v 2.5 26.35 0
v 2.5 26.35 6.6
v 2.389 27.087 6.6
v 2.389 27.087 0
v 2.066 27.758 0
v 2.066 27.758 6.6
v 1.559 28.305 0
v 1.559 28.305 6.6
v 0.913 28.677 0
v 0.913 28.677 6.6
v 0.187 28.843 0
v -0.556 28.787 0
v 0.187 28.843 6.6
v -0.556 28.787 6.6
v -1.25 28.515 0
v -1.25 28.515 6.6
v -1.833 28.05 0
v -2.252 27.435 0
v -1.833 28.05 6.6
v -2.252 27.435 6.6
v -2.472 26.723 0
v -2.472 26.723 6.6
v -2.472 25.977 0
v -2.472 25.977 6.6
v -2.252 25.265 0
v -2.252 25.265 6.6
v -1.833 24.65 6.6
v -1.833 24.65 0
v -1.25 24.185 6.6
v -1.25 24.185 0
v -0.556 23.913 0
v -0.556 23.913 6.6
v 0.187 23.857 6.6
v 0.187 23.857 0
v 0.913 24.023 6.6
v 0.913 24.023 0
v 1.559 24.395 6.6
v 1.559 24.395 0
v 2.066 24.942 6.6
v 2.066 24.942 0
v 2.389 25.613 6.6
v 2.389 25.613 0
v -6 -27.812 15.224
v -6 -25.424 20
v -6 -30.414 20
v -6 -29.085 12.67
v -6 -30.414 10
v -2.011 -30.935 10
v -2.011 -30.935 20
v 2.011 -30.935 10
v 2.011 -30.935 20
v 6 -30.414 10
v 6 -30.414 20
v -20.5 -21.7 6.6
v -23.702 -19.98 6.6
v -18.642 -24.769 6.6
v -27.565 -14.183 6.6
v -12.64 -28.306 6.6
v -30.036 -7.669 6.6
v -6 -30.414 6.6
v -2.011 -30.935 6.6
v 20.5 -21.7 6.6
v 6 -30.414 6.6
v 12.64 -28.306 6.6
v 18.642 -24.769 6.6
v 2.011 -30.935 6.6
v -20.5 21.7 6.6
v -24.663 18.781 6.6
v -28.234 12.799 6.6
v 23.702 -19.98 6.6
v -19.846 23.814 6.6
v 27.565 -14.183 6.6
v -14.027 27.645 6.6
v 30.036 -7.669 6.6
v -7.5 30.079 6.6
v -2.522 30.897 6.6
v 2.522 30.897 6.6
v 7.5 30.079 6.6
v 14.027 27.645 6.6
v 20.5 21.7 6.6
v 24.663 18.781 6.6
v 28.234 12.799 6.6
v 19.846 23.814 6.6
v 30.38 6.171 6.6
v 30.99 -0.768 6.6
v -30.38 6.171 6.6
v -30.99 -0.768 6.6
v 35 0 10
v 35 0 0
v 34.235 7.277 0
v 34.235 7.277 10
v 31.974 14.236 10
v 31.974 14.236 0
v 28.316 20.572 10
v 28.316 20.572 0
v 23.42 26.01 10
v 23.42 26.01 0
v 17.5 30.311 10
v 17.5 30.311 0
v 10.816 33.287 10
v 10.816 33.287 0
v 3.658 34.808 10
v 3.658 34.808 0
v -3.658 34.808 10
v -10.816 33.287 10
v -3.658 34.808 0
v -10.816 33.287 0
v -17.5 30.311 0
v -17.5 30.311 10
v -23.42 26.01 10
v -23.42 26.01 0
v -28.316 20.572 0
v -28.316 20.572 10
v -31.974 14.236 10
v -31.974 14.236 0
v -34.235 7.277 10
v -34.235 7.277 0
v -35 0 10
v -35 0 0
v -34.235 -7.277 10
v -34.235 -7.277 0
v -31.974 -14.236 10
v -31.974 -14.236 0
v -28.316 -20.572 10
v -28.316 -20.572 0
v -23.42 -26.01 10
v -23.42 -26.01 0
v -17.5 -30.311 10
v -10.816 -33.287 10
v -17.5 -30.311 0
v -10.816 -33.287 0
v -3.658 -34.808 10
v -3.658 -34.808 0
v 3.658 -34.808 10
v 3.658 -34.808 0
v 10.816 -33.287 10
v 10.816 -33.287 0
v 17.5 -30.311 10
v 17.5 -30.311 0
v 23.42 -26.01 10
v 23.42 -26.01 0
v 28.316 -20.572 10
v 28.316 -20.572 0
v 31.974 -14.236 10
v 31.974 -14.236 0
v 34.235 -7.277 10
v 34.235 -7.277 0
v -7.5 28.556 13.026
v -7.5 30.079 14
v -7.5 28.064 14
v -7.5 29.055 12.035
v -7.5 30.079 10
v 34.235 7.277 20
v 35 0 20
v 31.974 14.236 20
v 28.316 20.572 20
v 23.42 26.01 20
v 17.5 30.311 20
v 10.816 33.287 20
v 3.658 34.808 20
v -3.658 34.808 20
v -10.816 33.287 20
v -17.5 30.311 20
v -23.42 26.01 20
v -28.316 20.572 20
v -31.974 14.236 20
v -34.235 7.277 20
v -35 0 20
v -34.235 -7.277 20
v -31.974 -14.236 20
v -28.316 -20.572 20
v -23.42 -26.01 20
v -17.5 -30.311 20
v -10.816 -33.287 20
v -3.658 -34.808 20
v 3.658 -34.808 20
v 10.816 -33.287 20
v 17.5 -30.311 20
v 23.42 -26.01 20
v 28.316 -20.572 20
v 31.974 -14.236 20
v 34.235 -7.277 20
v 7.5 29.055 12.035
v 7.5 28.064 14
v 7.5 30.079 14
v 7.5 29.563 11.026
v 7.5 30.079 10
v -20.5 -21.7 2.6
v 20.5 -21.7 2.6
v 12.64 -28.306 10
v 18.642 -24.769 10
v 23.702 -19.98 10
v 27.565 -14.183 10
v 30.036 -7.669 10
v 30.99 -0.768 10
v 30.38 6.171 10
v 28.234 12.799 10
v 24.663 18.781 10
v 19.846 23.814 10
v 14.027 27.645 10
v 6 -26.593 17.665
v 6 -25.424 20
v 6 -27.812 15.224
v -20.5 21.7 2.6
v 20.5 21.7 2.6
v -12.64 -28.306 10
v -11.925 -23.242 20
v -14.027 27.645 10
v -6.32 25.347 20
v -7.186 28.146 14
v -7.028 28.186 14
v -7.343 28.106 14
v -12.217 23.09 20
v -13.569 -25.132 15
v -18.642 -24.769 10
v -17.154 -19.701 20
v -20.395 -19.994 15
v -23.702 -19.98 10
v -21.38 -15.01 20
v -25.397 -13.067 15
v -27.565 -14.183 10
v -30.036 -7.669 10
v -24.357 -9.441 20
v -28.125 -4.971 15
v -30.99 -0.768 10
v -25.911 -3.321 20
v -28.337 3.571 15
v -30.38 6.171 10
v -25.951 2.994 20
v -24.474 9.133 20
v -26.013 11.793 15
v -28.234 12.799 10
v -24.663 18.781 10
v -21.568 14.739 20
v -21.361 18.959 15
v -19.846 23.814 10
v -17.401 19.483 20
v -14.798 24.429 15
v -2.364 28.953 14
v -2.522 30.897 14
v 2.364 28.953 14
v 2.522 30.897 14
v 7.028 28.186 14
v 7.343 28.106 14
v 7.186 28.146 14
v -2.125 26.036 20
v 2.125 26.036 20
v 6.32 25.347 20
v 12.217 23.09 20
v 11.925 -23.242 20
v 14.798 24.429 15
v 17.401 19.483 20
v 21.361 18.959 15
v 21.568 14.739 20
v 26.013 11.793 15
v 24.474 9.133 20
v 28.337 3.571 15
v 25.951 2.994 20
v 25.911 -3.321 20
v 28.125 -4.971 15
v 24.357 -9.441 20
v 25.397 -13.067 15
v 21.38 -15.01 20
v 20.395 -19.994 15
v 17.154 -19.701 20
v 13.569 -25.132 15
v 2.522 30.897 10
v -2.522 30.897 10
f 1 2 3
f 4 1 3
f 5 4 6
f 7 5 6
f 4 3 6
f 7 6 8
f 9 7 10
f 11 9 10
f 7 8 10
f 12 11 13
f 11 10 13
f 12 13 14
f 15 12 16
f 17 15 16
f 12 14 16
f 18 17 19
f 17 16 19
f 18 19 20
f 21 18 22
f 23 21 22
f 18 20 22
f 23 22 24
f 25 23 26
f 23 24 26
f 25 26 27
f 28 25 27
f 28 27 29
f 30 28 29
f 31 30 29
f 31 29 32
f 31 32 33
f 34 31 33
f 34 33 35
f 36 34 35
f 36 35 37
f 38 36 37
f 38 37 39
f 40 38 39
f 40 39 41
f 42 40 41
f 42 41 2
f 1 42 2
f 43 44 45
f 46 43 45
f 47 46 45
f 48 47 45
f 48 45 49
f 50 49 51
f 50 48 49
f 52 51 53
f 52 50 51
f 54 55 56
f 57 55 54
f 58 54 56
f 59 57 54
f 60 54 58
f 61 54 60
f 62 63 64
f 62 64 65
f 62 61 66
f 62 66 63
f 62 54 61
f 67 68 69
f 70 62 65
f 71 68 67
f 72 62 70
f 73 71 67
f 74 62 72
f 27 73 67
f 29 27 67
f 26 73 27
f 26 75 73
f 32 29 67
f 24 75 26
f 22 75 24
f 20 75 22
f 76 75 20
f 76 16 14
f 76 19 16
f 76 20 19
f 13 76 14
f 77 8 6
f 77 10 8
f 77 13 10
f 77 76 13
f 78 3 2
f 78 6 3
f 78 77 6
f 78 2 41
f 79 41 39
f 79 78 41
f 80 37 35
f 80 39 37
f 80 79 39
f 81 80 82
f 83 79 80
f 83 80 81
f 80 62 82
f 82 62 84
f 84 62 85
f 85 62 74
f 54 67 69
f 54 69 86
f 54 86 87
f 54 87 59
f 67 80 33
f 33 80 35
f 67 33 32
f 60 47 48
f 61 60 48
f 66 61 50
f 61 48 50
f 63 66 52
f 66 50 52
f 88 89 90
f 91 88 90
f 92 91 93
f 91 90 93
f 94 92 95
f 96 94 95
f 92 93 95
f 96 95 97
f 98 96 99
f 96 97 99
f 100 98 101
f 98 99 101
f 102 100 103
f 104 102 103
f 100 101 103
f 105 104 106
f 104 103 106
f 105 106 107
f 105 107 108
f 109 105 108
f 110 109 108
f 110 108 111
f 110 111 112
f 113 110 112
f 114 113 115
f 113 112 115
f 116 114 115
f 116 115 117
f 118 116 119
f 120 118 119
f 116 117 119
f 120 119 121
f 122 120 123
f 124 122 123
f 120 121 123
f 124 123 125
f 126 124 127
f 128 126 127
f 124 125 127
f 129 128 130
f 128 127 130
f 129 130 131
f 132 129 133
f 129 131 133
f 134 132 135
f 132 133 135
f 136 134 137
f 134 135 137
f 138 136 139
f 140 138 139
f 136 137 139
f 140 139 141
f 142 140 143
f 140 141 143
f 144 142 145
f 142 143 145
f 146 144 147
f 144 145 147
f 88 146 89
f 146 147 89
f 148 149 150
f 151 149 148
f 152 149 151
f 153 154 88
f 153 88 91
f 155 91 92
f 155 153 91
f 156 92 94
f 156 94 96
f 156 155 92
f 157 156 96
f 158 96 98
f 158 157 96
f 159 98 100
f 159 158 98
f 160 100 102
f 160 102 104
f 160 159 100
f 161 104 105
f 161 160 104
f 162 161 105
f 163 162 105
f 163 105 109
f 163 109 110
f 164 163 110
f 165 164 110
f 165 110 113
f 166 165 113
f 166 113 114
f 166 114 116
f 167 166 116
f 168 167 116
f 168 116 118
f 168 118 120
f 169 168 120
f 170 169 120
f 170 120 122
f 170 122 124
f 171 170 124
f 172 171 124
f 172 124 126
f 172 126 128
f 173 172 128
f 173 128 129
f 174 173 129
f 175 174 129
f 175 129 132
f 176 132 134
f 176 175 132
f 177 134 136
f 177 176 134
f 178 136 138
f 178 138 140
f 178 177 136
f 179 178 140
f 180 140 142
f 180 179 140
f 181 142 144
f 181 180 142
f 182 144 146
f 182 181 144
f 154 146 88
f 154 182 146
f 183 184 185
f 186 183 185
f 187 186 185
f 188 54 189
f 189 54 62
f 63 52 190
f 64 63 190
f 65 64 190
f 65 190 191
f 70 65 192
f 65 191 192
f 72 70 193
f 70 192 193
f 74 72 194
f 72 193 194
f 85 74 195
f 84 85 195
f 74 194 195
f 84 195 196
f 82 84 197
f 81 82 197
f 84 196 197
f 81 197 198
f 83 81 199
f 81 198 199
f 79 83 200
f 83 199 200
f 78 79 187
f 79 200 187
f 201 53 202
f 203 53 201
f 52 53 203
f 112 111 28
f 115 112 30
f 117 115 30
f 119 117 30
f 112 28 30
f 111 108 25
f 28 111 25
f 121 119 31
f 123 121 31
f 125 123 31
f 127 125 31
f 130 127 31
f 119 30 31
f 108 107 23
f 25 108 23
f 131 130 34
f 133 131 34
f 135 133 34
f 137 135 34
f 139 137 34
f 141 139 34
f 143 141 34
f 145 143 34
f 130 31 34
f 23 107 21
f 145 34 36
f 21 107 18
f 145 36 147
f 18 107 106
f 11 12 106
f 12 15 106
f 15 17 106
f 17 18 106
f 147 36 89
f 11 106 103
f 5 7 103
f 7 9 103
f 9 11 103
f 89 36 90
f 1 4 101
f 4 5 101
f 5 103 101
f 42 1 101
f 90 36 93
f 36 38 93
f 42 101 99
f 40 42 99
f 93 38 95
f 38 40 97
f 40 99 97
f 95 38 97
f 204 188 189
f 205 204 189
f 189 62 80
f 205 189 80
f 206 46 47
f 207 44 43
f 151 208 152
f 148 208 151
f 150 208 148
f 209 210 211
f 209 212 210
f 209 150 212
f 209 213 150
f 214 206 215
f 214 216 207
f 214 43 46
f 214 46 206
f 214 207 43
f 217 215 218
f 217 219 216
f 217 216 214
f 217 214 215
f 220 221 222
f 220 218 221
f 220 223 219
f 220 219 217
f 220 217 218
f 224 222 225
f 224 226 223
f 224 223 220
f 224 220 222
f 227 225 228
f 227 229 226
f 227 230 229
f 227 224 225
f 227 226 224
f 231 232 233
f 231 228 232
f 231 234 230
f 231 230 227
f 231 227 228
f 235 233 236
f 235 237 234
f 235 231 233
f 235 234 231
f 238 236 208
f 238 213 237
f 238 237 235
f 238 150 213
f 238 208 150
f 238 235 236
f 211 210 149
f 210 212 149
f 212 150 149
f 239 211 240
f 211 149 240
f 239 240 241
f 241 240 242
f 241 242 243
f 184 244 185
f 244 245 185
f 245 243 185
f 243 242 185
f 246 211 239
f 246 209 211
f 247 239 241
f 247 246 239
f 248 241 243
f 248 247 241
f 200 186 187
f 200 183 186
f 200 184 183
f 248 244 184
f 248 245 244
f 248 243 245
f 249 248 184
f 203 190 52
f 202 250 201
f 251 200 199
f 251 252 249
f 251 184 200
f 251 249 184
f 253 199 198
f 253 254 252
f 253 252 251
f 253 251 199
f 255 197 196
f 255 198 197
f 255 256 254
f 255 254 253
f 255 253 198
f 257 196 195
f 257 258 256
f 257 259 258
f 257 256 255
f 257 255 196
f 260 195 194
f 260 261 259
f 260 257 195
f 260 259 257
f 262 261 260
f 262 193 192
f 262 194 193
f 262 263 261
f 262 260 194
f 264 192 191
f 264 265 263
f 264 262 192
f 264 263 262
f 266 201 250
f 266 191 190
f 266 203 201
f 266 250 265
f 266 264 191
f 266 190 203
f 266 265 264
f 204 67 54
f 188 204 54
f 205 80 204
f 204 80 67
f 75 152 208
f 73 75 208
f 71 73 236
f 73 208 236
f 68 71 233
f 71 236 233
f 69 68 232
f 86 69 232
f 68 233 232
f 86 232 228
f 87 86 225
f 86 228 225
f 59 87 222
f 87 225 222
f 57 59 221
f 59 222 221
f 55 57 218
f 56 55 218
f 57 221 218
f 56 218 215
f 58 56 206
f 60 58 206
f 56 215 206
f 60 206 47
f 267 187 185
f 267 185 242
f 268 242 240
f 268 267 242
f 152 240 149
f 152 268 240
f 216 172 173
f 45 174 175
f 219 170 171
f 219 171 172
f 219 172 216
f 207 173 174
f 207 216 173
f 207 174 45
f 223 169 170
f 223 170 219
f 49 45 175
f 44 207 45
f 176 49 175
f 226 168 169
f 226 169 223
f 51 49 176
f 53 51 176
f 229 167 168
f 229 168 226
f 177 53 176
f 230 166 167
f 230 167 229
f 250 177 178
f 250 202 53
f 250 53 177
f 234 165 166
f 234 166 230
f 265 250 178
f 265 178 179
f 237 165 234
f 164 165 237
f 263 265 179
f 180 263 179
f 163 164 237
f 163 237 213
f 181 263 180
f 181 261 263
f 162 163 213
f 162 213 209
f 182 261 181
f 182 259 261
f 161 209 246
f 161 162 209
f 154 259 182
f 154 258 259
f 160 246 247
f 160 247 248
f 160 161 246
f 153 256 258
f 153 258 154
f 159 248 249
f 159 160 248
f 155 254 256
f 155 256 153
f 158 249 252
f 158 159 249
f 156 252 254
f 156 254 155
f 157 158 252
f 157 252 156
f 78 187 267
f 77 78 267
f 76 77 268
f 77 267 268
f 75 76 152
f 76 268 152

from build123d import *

# Parameters (mm, degrees)
F0_R      = 35
F1_DEPTH  = 10
F2_R      = 2.5
F3_DEPTH  = 3.4
F4_DEPTH  = 10.001
F5_DEPTH  = 7.4
F2_R_2    = 35
F6_DEPTH  = 10
F6_TAPER  = -26
F7_R      = 39.8773258857
F7_R_2    = 35
F8_DEPTH  = 20.001
F9_DEPTH  = 4
F10_DEPTH = 10.0010001


# Not quite as in the source:
# - a feature names something its author has since deleted; it is built from what else it names


with BuildPart() as f1:
    # F0 (on Top) → F1 (new body)
    with BuildSketch(Plane.XY):
        Circle(F0_R)
    extrude(amount=F1_DEPTH)

    # F2 (on face) → F3 (cut)
    with BuildSketch(Plane.XY.offset(10)):
        with BuildLine():
            Line((7.5, 21.7), (7.5, 30.0790624854))
            ThreePointArc((7.5, 30.0790624854), (0, 31), (-7.5, 30.0790624854))
            Line((-7.5, 30.0790624854), (-7.5, 21.7))
            Line((-7.5, 21.7), (7.5, 21.7))
        make_face()
        with Locations((0, 26.35)):
            Circle(F2_R, mode=Mode.SUBTRACT)
        with BuildLine():
            Line((-7.5, 21.7), (-7.5, 30.0790624854))
            ThreePointArc((-7.5, 30.0790624854), (-30.9904741103, -0.7684493597), (-6, -30.4138126515))
            Line((-6, -30.4138126515), (-6, -21.7))
            Line((-6, -21.7), (-20.5, -21.7))
            Line((-20.5, -21.7), (-20.5, 21.7))
            Line((-20.5, 21.7), (-7.5, 21.7))
        make_face()
        with BuildLine():
            ThreePointArc((-6, -30.4138126515), (0, -31), (6, -30.4138126515))
            Line((6, -30.4138126515), (6, -21.7))
            Line((6, -21.7), (-6, -21.7))
            Line((-6, -21.7), (-6, -30.4138126515))
        make_face()
        with BuildLine():
            ThreePointArc((6, -30.4138126515), (23.9478600297, -19.685019685), (31, 0))
            ThreePointArc((31, 0), (24.4284670006, 19.085334684), (7.5, 30.0790624854))
            Line((7.5, 30.0790624854), (7.5, 21.7))
            Line((7.5, 21.7), (20.5, 21.7))
            Line((20.5, 21.7), (20.5, -21.7))
            Line((20.5, -21.7), (6, -21.7))
            Line((6, -21.7), (6, -30.4138126515))
        make_face()
    extrude(amount=-F3_DEPTH, mode=Mode.SUBTRACT)

    # F2 (on face) → F4 (cut, through all)
    with BuildSketch(Plane.XY.offset(10)):
        with Locations((0, 26.35)):
            Circle(F2_R)
    extrude(amount=-F4_DEPTH, mode=Mode.SUBTRACT)

    # F2 (on face) → F5 (cut)
    with BuildSketch(Plane.XY.offset(10)):
        Polygon((20.5, 21.7), (7.5, 21.7), (7.5, 20.0790624854), (0, 20.0790624854), (-7.5, 20.0790624854), (-7.5, 21.7), (-20.5, 21.7), (-20.5, -21.7), (-6, -21.7), (-6, -20.4138126515), (0, -20.4138126515), (6, -20.4138126515), (6, -21.7), (20.5, -21.7), align=None)
        Polygon((7.5, 20.0790624854), (7.5, 21.7), (-7.5, 21.7), (-7.5, 20.0790624854), (0, 20.0790624854), align=None)
        Polygon((-6, -21.7), (6, -21.7), (6, -20.4138126515), (0, -20.4138126515), (-6, -20.4138126515), align=None)
    extrude(amount=-F5_DEPTH, mode=Mode.SUBTRACT)

    # F2 (on face) → F6 (join)
    with BuildSketch(Plane.XY.offset(10)):
        Circle(F2_R_2)
        with BuildLine():
            ThreePointArc((7.5, 30.0790624854), (24.4284670006, 19.085334684), (31, 0))
            ThreePointArc((31, 0), (23.9478600297, -19.685019685), (6, -30.4138126515))
            ThreePointArc((6, -30.4138126515), (0, -31), (-6, -30.4138126515))
            ThreePointArc((-6, -30.4138126515), (-30.9904741103, -0.7684493597), (-7.5, 30.0790624854))
            ThreePointArc((-7.5, 30.0790624854), (0, 31), (7.5, 30.0790624854))
        make_face(mode=Mode.SUBTRACT)
    extrude(amount=F6_DEPTH, taper=F6_TAPER)

    # F7 (on face) → F8 (cut, through all)
    with BuildSketch(Plane.XY.offset(20)):
        Circle(F7_R)
        Circle(F7_R_2, mode=Mode.SUBTRACT)
    extrude(amount=-F8_DEPTH, mode=Mode.SUBTRACT)

    # F2 (on face) → F9 (cut)
    with BuildSketch(Plane.XY.offset(10)):
        with BuildLine():
            Line((7.5, 21.7), (7.5, 30.0790624854))
            ThreePointArc((7.5, 30.0790624854), (0, 31), (-7.5, 30.0790624854))
            Line((-7.5, 30.0790624854), (-7.5, 21.7))
            Line((-7.5, 21.7), (7.5, 21.7))
        make_face()
        with Locations((0, 26.35)):
            Circle(F2_R, mode=Mode.SUBTRACT)
        Polygon((7.5, 20.0790624854), (7.5, 21.7), (-7.5, 21.7), (-7.5, 20.0790624854), (0, 20.0790624854), align=None)
        with Locations((0, 26.35)):
            Circle(F2_R)
    extrude(amount=F9_DEPTH, mode=Mode.SUBTRACT)

    # F2 (on face) → F10 (cut, through all)
    with BuildSketch(Plane.XY.offset(10)):
        with BuildLine():
            ThreePointArc((-6, -30.4138126515), (0, -31), (6, -30.4138126515))
            Line((6, -30.4138126515), (6, -21.7))
            Line((6, -21.7), (-6, -21.7))
            Line((-6, -21.7), (-6, -30.4138126515))
        make_face()
        Polygon((-6, -21.7), (6, -21.7), (6, -20.4138126515), (0, -20.4138126515), (-6, -20.4138126515), align=None)
    extrude(amount=F10_DEPTH, mode=Mode.SUBTRACT)


solid = f1.part
